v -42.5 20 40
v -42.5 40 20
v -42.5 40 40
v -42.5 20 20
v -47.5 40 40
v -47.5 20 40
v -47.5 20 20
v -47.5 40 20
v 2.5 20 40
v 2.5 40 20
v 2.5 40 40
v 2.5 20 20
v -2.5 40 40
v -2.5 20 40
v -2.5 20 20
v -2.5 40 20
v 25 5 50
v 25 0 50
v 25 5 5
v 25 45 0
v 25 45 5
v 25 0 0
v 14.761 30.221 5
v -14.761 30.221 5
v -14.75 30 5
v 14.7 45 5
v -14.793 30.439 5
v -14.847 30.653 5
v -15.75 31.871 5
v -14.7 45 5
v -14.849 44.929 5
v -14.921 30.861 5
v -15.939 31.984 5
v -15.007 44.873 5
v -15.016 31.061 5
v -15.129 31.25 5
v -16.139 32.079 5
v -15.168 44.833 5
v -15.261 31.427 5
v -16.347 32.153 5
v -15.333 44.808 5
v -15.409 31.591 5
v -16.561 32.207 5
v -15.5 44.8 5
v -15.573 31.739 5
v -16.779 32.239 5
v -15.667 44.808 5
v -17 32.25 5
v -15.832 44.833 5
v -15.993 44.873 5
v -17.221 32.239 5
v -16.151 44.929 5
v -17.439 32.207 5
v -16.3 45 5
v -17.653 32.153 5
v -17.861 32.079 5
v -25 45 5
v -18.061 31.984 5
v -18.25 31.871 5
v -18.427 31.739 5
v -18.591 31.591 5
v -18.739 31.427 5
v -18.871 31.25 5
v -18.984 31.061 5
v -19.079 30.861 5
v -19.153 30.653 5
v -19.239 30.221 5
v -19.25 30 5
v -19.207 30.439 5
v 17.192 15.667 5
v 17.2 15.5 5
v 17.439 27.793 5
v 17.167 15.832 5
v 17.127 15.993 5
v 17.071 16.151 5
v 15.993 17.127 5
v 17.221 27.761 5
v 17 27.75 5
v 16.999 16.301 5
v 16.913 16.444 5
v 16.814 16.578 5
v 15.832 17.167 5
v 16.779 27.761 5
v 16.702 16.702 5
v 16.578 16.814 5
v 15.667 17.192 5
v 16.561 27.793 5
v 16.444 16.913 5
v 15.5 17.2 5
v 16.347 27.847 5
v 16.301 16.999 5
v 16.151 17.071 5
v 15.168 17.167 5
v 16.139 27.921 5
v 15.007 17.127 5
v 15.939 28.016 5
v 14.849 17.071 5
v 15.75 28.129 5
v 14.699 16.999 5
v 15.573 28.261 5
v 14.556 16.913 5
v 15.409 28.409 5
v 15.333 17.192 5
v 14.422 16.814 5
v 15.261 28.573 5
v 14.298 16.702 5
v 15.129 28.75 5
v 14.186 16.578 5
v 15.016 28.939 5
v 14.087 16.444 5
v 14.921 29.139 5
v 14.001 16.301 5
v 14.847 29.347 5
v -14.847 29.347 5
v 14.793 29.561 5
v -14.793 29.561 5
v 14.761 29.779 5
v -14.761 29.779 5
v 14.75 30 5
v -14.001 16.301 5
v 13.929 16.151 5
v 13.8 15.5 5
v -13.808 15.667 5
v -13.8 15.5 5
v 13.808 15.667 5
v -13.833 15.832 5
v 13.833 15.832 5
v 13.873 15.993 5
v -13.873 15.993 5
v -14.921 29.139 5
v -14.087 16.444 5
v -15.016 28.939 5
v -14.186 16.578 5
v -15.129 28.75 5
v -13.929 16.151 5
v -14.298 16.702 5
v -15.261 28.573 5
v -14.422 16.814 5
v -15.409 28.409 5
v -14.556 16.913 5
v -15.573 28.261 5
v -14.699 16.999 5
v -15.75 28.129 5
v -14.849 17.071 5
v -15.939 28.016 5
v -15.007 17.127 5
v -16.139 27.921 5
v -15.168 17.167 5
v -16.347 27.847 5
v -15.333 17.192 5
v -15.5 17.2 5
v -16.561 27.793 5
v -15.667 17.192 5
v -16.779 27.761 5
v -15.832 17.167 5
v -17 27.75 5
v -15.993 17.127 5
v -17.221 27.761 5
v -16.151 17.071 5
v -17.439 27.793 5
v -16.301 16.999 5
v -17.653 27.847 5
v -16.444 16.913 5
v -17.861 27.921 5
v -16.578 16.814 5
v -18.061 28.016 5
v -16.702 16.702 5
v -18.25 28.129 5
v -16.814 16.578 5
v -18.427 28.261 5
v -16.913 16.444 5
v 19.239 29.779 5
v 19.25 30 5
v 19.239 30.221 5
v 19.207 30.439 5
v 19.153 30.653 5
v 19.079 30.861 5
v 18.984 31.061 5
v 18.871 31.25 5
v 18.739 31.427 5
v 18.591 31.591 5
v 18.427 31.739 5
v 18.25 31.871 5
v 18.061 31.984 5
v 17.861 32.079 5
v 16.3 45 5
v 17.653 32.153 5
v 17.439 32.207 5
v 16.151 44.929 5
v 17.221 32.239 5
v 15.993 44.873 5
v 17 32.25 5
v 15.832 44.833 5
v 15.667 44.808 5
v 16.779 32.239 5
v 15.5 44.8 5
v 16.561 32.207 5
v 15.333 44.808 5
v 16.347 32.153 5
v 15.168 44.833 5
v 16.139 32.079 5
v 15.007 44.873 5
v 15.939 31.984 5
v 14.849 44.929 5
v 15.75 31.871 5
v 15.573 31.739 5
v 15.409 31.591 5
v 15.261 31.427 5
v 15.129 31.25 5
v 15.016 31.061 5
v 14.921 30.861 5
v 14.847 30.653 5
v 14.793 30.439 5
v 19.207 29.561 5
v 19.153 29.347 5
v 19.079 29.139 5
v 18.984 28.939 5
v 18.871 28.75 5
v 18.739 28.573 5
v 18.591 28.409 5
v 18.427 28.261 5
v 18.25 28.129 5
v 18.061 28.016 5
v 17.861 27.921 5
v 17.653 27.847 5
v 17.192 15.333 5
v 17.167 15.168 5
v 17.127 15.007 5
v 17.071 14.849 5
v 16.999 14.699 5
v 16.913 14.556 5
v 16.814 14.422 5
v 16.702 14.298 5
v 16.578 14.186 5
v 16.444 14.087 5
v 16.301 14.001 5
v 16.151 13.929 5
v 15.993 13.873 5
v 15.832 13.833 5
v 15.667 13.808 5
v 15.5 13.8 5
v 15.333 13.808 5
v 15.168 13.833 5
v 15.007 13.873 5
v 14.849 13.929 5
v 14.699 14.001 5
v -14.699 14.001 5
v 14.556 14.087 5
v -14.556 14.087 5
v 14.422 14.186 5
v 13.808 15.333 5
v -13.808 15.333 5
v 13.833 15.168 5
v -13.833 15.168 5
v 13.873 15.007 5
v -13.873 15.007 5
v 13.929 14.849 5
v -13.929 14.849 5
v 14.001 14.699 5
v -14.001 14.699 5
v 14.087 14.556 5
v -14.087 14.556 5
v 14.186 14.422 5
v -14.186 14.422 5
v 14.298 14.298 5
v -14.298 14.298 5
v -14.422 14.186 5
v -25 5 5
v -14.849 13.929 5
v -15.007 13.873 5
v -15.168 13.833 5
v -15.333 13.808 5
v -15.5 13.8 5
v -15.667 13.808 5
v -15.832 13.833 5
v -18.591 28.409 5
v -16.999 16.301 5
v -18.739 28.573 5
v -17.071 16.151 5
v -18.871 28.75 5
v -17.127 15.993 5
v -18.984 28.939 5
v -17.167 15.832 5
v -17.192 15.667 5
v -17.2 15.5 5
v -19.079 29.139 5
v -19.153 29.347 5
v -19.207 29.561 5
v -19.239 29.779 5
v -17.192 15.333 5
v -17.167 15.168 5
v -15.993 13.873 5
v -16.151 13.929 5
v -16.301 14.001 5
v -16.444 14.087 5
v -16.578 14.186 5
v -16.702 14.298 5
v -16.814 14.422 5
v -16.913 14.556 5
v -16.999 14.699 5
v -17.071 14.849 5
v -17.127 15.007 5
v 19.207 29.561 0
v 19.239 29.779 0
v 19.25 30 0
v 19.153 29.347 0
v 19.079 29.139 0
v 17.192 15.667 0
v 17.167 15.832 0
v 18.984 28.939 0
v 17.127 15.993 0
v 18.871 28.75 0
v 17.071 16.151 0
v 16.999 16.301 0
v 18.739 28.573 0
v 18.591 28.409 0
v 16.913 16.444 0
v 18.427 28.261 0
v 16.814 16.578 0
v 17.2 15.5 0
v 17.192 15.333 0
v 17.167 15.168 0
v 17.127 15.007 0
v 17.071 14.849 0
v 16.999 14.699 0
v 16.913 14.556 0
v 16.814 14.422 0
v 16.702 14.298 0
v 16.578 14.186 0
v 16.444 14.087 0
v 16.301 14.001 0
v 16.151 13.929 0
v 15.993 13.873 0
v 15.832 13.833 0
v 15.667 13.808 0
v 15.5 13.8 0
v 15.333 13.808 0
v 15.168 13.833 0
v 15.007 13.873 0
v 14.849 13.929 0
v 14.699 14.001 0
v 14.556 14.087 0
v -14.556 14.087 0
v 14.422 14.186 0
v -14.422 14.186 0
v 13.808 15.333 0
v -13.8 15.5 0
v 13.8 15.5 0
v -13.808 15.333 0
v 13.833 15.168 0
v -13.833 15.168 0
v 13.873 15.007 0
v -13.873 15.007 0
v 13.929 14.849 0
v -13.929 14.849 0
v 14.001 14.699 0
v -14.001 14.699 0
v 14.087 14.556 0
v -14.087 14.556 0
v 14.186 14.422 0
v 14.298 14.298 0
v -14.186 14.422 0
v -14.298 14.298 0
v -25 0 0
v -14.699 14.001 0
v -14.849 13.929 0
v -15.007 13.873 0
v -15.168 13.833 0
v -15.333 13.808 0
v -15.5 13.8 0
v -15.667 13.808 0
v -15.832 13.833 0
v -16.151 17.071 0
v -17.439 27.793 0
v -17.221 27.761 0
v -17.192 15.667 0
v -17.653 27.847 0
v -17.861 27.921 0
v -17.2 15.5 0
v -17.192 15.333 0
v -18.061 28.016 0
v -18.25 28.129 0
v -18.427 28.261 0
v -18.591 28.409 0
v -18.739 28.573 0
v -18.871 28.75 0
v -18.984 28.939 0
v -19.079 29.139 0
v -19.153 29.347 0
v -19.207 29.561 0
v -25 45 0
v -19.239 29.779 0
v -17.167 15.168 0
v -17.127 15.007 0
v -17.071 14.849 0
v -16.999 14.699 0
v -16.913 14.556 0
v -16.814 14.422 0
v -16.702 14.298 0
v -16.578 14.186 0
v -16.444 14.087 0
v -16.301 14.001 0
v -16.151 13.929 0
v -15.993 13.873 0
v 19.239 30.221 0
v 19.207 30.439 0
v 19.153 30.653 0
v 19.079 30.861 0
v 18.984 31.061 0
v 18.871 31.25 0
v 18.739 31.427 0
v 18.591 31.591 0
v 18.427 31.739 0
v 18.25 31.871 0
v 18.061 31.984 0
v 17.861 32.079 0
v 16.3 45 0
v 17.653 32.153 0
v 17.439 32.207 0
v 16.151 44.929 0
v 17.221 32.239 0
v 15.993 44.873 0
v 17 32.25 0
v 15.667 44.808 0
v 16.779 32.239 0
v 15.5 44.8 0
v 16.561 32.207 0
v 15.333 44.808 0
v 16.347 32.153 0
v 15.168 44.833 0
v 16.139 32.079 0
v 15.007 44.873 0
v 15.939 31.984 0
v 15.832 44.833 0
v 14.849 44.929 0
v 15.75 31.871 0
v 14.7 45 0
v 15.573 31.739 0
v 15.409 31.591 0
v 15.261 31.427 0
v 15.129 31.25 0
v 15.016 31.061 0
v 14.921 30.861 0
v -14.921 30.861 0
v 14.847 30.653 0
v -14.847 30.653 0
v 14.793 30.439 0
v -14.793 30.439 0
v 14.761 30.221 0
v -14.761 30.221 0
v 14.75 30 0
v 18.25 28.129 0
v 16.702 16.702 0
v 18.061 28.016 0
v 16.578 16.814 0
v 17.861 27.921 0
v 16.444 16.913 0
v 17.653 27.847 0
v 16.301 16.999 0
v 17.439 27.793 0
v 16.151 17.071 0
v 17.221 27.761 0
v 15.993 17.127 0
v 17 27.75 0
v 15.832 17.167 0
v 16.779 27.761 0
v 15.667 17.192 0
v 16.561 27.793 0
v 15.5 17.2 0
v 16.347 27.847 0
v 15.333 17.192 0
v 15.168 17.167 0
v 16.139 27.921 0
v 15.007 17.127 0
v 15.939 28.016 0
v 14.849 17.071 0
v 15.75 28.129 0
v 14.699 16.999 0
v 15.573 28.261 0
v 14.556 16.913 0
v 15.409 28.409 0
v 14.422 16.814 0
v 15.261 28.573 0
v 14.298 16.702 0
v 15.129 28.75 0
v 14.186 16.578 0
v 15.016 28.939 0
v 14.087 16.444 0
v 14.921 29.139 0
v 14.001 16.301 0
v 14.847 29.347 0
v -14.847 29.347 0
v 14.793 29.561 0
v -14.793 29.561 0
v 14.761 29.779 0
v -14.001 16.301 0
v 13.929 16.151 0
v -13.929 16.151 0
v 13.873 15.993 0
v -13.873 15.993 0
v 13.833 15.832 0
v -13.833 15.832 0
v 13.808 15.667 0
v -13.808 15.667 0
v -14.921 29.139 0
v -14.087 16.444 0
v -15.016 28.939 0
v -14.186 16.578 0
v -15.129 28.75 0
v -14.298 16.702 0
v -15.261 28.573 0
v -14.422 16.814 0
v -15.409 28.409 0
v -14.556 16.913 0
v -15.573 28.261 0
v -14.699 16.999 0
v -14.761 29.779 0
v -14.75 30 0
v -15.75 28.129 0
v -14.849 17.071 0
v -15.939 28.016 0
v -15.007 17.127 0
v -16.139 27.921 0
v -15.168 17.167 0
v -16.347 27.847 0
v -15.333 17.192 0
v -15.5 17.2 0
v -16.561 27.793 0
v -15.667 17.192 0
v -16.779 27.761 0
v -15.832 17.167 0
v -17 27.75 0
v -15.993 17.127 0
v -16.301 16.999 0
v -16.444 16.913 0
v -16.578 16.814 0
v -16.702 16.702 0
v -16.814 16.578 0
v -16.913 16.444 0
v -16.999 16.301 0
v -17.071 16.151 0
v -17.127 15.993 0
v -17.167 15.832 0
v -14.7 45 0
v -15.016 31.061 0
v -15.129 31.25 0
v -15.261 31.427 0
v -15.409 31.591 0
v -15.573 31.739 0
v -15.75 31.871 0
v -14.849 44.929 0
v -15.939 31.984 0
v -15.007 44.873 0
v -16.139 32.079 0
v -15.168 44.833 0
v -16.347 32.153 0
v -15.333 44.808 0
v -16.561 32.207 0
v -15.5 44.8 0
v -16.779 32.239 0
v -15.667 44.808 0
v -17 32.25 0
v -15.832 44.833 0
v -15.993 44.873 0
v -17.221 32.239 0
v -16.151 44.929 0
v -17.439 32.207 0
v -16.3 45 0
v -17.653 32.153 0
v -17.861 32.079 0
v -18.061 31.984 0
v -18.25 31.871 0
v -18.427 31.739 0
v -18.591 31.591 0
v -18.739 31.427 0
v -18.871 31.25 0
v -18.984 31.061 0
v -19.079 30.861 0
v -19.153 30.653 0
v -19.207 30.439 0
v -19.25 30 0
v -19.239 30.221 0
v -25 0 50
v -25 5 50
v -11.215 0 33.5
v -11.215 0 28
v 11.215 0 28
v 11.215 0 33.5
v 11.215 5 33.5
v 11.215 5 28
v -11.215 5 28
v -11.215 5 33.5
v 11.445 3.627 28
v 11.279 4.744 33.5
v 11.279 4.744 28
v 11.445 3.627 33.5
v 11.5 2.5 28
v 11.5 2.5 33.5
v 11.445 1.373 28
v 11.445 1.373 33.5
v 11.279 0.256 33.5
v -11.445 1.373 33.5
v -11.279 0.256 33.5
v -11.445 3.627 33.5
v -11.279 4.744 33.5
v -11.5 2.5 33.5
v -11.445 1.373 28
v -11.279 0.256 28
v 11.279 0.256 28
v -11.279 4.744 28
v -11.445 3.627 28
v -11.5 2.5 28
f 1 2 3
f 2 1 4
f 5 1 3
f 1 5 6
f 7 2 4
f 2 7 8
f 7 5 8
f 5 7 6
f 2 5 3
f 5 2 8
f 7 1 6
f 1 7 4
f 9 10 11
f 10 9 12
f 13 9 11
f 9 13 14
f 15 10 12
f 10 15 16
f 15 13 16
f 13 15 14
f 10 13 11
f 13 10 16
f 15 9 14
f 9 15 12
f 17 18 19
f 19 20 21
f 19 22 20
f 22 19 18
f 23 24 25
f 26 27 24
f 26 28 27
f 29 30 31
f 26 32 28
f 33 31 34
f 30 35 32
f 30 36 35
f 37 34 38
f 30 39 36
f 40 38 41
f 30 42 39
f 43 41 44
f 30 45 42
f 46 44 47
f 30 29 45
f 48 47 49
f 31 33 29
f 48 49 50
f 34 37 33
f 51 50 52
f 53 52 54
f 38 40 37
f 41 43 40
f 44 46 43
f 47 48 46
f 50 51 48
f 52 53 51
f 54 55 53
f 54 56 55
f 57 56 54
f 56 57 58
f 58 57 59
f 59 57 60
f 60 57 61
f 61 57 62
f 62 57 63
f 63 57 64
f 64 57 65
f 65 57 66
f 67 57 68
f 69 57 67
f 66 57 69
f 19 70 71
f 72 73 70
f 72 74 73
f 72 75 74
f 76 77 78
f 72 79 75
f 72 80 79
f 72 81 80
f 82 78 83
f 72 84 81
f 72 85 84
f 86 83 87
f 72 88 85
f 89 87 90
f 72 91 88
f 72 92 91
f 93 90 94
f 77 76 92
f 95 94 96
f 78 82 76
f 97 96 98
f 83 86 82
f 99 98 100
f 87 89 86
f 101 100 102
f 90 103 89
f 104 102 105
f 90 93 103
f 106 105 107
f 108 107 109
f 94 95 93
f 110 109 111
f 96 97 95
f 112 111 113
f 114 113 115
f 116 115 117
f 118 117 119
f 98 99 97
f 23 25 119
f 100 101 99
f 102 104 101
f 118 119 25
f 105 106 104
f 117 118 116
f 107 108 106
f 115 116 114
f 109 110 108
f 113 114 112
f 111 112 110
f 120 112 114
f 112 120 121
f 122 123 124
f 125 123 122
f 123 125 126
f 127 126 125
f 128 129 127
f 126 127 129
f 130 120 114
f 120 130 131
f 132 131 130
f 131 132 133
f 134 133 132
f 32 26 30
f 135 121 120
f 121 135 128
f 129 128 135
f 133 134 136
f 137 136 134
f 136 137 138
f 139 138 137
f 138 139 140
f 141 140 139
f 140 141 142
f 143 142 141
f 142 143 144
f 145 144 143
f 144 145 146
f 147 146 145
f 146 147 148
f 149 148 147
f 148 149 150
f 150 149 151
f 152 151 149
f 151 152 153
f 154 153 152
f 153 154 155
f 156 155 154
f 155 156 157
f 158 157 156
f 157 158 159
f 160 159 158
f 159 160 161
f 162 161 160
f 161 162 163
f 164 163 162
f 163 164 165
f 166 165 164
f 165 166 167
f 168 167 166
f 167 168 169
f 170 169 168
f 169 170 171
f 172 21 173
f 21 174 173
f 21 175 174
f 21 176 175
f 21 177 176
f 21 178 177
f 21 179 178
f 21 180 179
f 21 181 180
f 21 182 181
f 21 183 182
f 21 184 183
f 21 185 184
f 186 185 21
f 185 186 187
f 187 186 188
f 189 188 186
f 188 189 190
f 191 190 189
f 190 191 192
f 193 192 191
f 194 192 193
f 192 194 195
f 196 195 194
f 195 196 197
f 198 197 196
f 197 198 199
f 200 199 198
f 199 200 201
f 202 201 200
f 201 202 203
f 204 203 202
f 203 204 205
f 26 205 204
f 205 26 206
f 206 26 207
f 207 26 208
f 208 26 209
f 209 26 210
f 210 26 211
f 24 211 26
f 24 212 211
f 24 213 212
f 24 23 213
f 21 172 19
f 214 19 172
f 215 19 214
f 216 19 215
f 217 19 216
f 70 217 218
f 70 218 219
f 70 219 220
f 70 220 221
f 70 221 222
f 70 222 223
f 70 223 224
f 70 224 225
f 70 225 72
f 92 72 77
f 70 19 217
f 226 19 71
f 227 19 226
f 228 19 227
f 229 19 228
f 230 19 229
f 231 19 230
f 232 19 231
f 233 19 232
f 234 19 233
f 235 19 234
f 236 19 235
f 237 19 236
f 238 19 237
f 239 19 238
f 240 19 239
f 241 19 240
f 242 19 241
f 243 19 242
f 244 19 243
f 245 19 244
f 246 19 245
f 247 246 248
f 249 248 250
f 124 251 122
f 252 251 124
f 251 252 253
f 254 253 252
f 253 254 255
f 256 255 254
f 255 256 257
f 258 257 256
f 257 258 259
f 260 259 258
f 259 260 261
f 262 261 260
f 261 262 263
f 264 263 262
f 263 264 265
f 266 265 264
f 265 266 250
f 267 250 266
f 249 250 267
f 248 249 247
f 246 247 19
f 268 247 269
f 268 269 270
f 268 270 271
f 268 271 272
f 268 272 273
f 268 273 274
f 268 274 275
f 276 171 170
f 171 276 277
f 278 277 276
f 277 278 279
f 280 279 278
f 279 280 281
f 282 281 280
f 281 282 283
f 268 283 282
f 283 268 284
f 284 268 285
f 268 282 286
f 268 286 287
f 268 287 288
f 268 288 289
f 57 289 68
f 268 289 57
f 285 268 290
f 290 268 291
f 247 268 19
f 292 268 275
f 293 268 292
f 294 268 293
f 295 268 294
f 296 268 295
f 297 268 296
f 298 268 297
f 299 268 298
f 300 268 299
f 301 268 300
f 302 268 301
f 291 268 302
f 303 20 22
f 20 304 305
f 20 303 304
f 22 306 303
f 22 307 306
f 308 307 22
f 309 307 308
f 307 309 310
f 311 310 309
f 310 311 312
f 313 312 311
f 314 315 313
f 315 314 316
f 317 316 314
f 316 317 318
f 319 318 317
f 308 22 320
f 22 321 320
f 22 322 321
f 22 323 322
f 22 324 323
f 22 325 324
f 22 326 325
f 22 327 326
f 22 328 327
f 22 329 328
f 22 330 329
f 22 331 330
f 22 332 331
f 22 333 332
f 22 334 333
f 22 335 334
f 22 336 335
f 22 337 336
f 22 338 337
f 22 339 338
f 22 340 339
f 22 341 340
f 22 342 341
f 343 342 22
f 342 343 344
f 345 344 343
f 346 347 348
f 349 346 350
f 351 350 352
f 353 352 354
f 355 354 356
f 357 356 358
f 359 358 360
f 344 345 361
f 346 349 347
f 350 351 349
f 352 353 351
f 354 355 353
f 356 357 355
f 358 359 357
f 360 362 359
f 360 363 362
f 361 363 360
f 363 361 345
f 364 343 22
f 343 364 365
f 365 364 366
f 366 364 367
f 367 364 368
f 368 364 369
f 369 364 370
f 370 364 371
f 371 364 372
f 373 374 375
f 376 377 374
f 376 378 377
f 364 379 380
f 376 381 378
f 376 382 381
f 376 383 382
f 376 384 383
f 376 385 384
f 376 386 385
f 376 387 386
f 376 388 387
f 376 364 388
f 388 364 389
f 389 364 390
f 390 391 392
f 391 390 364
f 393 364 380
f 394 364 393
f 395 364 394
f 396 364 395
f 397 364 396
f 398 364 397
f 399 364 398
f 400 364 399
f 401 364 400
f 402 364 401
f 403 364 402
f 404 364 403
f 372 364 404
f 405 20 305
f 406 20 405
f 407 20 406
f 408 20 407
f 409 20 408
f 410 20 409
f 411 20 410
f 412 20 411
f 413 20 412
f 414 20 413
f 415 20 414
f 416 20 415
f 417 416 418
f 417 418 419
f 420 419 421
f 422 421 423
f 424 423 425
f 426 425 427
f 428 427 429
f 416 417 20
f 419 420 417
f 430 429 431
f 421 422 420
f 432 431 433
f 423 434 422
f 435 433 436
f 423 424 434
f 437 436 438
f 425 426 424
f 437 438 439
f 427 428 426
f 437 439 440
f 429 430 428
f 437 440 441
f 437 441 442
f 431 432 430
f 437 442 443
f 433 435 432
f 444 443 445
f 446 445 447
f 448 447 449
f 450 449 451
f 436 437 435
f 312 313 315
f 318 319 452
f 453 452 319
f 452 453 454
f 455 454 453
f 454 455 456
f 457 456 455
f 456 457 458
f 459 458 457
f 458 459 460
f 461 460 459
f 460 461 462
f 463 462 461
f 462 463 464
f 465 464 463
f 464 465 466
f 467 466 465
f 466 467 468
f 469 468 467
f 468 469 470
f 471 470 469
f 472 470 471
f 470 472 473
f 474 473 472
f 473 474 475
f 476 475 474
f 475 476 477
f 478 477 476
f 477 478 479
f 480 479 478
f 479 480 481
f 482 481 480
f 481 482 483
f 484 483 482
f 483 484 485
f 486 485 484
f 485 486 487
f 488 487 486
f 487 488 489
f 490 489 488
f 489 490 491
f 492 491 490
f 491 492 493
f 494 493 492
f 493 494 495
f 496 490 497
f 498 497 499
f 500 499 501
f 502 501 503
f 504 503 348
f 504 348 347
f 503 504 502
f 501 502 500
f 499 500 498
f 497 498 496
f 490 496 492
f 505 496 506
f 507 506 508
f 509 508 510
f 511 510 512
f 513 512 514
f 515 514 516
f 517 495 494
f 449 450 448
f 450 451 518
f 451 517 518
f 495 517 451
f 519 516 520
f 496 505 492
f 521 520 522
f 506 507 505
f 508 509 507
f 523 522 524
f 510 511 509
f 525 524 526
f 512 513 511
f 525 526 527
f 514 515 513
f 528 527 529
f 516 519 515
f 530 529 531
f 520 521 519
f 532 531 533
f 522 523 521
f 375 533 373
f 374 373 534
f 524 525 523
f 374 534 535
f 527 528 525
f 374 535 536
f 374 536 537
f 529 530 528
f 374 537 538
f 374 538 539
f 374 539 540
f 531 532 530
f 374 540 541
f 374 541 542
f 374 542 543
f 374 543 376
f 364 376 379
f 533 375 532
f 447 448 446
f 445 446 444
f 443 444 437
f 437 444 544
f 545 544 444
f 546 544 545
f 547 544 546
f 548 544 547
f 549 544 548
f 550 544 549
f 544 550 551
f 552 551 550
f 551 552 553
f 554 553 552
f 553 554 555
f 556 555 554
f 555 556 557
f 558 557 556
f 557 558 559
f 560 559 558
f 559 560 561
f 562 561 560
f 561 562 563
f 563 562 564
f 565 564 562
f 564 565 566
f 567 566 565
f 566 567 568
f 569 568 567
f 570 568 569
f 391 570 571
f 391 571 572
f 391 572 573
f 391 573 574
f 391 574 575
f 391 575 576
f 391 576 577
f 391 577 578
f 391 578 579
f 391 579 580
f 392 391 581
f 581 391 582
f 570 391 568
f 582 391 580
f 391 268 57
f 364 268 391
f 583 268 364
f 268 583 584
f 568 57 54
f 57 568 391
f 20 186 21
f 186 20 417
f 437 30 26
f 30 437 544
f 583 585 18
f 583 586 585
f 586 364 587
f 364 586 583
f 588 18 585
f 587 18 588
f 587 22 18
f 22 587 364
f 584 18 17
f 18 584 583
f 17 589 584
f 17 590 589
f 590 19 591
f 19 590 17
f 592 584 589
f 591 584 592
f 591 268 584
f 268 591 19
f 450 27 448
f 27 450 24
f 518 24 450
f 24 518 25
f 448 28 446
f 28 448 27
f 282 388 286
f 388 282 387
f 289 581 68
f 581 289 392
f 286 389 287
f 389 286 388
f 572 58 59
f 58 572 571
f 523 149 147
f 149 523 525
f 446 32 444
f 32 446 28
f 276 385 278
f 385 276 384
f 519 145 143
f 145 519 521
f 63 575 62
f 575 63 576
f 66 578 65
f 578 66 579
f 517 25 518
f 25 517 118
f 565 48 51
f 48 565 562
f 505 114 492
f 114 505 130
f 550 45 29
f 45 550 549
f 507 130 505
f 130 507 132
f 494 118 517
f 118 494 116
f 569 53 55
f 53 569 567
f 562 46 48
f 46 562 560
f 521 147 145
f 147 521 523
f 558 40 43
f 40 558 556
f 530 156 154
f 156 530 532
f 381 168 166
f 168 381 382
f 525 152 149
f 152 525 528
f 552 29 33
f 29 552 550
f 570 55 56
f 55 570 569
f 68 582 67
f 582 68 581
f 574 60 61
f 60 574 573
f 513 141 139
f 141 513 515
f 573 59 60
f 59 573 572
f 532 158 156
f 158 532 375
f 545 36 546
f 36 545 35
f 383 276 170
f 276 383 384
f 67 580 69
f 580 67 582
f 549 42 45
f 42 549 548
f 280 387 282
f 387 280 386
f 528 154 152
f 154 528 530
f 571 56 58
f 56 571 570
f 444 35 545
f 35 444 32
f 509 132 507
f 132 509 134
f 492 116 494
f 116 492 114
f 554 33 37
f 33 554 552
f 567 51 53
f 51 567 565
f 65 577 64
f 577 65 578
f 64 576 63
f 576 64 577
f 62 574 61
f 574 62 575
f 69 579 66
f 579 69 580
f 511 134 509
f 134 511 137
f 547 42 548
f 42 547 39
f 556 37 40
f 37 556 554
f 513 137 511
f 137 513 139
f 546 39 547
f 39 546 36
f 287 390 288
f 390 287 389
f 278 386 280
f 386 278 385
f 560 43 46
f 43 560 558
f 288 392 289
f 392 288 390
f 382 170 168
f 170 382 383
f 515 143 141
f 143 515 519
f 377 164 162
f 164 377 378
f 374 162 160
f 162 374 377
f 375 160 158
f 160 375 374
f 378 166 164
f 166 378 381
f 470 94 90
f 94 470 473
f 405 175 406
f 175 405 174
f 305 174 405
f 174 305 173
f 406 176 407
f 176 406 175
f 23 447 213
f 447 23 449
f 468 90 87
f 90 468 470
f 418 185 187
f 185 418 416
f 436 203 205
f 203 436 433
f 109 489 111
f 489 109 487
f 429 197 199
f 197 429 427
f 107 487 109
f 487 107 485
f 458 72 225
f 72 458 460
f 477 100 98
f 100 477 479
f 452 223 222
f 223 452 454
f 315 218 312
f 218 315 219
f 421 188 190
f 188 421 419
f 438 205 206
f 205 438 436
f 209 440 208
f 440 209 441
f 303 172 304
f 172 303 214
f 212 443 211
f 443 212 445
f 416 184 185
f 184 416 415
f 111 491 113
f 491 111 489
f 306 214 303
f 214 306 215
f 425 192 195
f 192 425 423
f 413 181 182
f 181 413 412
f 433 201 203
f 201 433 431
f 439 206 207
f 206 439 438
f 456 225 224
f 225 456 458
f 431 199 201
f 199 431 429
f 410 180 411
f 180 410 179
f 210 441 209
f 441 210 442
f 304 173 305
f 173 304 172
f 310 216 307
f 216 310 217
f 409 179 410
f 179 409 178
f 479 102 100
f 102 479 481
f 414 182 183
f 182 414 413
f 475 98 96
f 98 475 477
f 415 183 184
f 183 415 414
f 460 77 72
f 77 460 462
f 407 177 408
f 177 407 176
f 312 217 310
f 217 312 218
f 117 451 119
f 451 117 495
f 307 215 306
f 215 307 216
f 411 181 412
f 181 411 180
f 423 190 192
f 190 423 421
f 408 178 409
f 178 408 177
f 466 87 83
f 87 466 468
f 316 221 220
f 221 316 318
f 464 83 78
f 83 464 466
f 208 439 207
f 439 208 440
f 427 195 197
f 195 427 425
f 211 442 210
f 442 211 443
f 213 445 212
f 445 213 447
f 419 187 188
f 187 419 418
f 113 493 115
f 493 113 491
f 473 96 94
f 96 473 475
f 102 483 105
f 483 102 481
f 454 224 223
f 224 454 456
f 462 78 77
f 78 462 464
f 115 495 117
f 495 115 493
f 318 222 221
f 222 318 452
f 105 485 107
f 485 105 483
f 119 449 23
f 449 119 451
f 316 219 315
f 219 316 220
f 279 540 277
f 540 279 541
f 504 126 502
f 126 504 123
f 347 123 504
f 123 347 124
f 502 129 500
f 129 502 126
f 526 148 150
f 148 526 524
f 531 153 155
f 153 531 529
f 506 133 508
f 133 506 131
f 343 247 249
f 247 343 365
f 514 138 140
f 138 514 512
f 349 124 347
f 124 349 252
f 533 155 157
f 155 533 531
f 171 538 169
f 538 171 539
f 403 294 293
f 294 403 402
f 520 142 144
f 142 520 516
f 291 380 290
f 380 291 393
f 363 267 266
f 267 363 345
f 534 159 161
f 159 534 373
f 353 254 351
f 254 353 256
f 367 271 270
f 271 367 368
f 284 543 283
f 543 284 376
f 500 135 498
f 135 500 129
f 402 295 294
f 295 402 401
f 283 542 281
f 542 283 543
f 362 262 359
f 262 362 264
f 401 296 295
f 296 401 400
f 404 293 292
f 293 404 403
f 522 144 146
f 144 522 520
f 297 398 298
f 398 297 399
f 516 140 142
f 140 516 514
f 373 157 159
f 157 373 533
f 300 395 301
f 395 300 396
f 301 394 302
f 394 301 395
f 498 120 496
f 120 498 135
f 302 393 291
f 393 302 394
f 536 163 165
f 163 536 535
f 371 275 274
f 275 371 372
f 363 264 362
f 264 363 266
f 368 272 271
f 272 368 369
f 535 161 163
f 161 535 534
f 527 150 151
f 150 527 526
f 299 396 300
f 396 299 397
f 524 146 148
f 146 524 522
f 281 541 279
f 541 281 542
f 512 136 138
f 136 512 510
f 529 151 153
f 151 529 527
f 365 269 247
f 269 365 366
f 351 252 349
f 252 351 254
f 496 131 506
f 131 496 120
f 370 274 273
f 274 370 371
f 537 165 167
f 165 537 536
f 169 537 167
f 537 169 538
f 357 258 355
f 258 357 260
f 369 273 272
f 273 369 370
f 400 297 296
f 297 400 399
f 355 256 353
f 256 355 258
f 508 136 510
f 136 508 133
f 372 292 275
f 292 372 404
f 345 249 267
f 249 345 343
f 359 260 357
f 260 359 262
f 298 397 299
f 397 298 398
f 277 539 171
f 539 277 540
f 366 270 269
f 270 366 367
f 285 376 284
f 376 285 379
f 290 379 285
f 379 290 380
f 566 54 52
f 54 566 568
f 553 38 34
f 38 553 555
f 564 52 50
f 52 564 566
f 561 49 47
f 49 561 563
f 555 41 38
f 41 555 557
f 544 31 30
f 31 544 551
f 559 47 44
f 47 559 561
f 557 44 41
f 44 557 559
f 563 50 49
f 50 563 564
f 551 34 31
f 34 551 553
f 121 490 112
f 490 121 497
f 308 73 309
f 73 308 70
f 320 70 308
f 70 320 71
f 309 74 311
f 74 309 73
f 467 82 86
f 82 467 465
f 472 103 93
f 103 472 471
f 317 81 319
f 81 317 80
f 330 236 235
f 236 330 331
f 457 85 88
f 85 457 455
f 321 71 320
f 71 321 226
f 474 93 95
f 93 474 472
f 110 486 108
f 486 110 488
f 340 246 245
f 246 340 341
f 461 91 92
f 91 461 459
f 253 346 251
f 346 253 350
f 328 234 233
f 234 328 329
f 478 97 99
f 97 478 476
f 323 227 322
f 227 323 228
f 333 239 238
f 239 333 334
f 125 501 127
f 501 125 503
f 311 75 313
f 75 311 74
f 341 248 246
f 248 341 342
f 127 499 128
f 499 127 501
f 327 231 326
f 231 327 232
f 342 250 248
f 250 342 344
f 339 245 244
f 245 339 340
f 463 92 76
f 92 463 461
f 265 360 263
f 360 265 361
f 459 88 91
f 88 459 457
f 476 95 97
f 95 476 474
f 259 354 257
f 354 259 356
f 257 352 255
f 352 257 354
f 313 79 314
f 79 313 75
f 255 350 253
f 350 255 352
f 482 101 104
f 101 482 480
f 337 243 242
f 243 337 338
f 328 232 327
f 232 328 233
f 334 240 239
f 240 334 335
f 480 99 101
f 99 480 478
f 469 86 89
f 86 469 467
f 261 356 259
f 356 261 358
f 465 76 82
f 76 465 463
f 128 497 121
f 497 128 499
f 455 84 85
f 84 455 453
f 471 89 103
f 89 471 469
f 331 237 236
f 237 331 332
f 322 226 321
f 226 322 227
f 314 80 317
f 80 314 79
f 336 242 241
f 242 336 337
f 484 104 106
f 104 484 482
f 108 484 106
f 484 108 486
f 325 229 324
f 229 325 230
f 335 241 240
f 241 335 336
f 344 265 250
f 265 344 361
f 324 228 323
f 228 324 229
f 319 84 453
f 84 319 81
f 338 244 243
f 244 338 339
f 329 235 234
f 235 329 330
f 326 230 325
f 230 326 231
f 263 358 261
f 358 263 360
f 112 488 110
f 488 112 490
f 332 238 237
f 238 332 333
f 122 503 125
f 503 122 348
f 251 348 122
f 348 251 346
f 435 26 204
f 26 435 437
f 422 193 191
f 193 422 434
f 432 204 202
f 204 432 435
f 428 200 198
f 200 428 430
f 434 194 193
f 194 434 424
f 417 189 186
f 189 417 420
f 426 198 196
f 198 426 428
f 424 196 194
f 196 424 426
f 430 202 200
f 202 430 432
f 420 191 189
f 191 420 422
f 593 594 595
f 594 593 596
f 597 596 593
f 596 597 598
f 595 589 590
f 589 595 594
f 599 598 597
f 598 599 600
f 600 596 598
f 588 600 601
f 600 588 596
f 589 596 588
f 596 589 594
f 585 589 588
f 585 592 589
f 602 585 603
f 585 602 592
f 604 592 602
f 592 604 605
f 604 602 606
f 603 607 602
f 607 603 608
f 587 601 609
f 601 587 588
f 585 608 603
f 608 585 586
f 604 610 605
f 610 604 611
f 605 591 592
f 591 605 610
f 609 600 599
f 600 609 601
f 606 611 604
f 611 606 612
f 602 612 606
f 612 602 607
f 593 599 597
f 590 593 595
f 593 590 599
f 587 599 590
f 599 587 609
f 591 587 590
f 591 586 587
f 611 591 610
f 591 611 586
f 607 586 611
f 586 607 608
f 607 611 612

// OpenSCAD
// L-shaped mounting bracket for NEMA 17 stepper motor
// Print orientation: base plate on bed (z = 0), motor plate builds upward (+Z)

// ---------- Parameters ----------
base_x0      = -25;   // base plate x start
base_x1      = 25;    // base plate x end
base_y0      = 0;     // base plate y start
base_y1      = 45;    // base plate y end
base_z1      = 5;     // base plate top z

motor_x0     = -25;   // motor plate x start
motor_x1     = 25;    // motor plate x end
motor_y0     = 0;     // motor plate y start
motor_y1     = 5;     // motor plate top y (z = 0..50)
motor_z1     = 50;    // motor plate height

hole_m4_x    = -17;   // M4 hole x positions
hole_m4_y    = 30;    // M4 hole y position
hole_m4_d    = 4.5;   // M4 hole diameter

hole_boss_d  = 23;    // motor centring boss hole diameter
hole_boss_x  = 0;     // boss hole x centre
hole_boss_z  = 28;    // boss hole z centre

hole_m3_d    = 3.4;   // M3 screw hole diameter
hole_m3_p    = 31;    // square pattern side length
hole_m3_n    = 4;     // number of screw holes

gusset_t     = 5;     // gusset thickness (x)
gusset_leg   = 20;    // right triangle leg length (y and z)
gusset_x0    = -25;   // gusset left edge x
gusset_x1    = 20;    // gusset right edge x

eps          = 0.5;   // cutter overshoot past faces

$fn = 64;

// ---------- Model ----------
difference() {
    union() {
        // Base plate
        translate([base_x0, base_y0, 0])
            cube([base_x1 - base_x0, base_y1 - base_y0, base_z1]);

        // Vertical motor plate
        translate([motor_x0, motor_y0, 0])
            cube([motor_x1 - motor_x0, motor_y1, motor_z1]);

        // Gussets, flush with left and right edges
        for (sx = [-1, 1])
            translate([gusset_x0 + sx * (gusset_x1 - gusset_x0) / 2,
                       gusset_leg, gusset_leg])
                cube([gusset_t, gusset_leg, gusset_leg]);
    }

    // M4 through-holes
    for (x = [hole_m4_x, -hole_m4_x])
        translate([x, hole_m4_y, -eps])
            cylinder(d = hole_m4_d, h = base_z1 + motor_y1 + 2 * eps);

    // Boss hole
    translate([hole_boss_x, motor_y1 / 2, hole_boss_z])
        cylinder(d = hole_boss_d, h = motor_y1 + eps);

    // M3 screw holes on square pattern
    for (i = [0 : hole_m3_n - 1])
        for (j = [0 : hole_m3_n - 1])
            translate([(i - (hole_m3_n - 1) / 2) * hole_m3_p,
                       (j - (hole_m3_n - 1) / 2) * hole_m3_p,
                       -eps])
                cylinder(d = hole_m3_d, h = base_z1 + motor_y1 + 2 * eps);
}
